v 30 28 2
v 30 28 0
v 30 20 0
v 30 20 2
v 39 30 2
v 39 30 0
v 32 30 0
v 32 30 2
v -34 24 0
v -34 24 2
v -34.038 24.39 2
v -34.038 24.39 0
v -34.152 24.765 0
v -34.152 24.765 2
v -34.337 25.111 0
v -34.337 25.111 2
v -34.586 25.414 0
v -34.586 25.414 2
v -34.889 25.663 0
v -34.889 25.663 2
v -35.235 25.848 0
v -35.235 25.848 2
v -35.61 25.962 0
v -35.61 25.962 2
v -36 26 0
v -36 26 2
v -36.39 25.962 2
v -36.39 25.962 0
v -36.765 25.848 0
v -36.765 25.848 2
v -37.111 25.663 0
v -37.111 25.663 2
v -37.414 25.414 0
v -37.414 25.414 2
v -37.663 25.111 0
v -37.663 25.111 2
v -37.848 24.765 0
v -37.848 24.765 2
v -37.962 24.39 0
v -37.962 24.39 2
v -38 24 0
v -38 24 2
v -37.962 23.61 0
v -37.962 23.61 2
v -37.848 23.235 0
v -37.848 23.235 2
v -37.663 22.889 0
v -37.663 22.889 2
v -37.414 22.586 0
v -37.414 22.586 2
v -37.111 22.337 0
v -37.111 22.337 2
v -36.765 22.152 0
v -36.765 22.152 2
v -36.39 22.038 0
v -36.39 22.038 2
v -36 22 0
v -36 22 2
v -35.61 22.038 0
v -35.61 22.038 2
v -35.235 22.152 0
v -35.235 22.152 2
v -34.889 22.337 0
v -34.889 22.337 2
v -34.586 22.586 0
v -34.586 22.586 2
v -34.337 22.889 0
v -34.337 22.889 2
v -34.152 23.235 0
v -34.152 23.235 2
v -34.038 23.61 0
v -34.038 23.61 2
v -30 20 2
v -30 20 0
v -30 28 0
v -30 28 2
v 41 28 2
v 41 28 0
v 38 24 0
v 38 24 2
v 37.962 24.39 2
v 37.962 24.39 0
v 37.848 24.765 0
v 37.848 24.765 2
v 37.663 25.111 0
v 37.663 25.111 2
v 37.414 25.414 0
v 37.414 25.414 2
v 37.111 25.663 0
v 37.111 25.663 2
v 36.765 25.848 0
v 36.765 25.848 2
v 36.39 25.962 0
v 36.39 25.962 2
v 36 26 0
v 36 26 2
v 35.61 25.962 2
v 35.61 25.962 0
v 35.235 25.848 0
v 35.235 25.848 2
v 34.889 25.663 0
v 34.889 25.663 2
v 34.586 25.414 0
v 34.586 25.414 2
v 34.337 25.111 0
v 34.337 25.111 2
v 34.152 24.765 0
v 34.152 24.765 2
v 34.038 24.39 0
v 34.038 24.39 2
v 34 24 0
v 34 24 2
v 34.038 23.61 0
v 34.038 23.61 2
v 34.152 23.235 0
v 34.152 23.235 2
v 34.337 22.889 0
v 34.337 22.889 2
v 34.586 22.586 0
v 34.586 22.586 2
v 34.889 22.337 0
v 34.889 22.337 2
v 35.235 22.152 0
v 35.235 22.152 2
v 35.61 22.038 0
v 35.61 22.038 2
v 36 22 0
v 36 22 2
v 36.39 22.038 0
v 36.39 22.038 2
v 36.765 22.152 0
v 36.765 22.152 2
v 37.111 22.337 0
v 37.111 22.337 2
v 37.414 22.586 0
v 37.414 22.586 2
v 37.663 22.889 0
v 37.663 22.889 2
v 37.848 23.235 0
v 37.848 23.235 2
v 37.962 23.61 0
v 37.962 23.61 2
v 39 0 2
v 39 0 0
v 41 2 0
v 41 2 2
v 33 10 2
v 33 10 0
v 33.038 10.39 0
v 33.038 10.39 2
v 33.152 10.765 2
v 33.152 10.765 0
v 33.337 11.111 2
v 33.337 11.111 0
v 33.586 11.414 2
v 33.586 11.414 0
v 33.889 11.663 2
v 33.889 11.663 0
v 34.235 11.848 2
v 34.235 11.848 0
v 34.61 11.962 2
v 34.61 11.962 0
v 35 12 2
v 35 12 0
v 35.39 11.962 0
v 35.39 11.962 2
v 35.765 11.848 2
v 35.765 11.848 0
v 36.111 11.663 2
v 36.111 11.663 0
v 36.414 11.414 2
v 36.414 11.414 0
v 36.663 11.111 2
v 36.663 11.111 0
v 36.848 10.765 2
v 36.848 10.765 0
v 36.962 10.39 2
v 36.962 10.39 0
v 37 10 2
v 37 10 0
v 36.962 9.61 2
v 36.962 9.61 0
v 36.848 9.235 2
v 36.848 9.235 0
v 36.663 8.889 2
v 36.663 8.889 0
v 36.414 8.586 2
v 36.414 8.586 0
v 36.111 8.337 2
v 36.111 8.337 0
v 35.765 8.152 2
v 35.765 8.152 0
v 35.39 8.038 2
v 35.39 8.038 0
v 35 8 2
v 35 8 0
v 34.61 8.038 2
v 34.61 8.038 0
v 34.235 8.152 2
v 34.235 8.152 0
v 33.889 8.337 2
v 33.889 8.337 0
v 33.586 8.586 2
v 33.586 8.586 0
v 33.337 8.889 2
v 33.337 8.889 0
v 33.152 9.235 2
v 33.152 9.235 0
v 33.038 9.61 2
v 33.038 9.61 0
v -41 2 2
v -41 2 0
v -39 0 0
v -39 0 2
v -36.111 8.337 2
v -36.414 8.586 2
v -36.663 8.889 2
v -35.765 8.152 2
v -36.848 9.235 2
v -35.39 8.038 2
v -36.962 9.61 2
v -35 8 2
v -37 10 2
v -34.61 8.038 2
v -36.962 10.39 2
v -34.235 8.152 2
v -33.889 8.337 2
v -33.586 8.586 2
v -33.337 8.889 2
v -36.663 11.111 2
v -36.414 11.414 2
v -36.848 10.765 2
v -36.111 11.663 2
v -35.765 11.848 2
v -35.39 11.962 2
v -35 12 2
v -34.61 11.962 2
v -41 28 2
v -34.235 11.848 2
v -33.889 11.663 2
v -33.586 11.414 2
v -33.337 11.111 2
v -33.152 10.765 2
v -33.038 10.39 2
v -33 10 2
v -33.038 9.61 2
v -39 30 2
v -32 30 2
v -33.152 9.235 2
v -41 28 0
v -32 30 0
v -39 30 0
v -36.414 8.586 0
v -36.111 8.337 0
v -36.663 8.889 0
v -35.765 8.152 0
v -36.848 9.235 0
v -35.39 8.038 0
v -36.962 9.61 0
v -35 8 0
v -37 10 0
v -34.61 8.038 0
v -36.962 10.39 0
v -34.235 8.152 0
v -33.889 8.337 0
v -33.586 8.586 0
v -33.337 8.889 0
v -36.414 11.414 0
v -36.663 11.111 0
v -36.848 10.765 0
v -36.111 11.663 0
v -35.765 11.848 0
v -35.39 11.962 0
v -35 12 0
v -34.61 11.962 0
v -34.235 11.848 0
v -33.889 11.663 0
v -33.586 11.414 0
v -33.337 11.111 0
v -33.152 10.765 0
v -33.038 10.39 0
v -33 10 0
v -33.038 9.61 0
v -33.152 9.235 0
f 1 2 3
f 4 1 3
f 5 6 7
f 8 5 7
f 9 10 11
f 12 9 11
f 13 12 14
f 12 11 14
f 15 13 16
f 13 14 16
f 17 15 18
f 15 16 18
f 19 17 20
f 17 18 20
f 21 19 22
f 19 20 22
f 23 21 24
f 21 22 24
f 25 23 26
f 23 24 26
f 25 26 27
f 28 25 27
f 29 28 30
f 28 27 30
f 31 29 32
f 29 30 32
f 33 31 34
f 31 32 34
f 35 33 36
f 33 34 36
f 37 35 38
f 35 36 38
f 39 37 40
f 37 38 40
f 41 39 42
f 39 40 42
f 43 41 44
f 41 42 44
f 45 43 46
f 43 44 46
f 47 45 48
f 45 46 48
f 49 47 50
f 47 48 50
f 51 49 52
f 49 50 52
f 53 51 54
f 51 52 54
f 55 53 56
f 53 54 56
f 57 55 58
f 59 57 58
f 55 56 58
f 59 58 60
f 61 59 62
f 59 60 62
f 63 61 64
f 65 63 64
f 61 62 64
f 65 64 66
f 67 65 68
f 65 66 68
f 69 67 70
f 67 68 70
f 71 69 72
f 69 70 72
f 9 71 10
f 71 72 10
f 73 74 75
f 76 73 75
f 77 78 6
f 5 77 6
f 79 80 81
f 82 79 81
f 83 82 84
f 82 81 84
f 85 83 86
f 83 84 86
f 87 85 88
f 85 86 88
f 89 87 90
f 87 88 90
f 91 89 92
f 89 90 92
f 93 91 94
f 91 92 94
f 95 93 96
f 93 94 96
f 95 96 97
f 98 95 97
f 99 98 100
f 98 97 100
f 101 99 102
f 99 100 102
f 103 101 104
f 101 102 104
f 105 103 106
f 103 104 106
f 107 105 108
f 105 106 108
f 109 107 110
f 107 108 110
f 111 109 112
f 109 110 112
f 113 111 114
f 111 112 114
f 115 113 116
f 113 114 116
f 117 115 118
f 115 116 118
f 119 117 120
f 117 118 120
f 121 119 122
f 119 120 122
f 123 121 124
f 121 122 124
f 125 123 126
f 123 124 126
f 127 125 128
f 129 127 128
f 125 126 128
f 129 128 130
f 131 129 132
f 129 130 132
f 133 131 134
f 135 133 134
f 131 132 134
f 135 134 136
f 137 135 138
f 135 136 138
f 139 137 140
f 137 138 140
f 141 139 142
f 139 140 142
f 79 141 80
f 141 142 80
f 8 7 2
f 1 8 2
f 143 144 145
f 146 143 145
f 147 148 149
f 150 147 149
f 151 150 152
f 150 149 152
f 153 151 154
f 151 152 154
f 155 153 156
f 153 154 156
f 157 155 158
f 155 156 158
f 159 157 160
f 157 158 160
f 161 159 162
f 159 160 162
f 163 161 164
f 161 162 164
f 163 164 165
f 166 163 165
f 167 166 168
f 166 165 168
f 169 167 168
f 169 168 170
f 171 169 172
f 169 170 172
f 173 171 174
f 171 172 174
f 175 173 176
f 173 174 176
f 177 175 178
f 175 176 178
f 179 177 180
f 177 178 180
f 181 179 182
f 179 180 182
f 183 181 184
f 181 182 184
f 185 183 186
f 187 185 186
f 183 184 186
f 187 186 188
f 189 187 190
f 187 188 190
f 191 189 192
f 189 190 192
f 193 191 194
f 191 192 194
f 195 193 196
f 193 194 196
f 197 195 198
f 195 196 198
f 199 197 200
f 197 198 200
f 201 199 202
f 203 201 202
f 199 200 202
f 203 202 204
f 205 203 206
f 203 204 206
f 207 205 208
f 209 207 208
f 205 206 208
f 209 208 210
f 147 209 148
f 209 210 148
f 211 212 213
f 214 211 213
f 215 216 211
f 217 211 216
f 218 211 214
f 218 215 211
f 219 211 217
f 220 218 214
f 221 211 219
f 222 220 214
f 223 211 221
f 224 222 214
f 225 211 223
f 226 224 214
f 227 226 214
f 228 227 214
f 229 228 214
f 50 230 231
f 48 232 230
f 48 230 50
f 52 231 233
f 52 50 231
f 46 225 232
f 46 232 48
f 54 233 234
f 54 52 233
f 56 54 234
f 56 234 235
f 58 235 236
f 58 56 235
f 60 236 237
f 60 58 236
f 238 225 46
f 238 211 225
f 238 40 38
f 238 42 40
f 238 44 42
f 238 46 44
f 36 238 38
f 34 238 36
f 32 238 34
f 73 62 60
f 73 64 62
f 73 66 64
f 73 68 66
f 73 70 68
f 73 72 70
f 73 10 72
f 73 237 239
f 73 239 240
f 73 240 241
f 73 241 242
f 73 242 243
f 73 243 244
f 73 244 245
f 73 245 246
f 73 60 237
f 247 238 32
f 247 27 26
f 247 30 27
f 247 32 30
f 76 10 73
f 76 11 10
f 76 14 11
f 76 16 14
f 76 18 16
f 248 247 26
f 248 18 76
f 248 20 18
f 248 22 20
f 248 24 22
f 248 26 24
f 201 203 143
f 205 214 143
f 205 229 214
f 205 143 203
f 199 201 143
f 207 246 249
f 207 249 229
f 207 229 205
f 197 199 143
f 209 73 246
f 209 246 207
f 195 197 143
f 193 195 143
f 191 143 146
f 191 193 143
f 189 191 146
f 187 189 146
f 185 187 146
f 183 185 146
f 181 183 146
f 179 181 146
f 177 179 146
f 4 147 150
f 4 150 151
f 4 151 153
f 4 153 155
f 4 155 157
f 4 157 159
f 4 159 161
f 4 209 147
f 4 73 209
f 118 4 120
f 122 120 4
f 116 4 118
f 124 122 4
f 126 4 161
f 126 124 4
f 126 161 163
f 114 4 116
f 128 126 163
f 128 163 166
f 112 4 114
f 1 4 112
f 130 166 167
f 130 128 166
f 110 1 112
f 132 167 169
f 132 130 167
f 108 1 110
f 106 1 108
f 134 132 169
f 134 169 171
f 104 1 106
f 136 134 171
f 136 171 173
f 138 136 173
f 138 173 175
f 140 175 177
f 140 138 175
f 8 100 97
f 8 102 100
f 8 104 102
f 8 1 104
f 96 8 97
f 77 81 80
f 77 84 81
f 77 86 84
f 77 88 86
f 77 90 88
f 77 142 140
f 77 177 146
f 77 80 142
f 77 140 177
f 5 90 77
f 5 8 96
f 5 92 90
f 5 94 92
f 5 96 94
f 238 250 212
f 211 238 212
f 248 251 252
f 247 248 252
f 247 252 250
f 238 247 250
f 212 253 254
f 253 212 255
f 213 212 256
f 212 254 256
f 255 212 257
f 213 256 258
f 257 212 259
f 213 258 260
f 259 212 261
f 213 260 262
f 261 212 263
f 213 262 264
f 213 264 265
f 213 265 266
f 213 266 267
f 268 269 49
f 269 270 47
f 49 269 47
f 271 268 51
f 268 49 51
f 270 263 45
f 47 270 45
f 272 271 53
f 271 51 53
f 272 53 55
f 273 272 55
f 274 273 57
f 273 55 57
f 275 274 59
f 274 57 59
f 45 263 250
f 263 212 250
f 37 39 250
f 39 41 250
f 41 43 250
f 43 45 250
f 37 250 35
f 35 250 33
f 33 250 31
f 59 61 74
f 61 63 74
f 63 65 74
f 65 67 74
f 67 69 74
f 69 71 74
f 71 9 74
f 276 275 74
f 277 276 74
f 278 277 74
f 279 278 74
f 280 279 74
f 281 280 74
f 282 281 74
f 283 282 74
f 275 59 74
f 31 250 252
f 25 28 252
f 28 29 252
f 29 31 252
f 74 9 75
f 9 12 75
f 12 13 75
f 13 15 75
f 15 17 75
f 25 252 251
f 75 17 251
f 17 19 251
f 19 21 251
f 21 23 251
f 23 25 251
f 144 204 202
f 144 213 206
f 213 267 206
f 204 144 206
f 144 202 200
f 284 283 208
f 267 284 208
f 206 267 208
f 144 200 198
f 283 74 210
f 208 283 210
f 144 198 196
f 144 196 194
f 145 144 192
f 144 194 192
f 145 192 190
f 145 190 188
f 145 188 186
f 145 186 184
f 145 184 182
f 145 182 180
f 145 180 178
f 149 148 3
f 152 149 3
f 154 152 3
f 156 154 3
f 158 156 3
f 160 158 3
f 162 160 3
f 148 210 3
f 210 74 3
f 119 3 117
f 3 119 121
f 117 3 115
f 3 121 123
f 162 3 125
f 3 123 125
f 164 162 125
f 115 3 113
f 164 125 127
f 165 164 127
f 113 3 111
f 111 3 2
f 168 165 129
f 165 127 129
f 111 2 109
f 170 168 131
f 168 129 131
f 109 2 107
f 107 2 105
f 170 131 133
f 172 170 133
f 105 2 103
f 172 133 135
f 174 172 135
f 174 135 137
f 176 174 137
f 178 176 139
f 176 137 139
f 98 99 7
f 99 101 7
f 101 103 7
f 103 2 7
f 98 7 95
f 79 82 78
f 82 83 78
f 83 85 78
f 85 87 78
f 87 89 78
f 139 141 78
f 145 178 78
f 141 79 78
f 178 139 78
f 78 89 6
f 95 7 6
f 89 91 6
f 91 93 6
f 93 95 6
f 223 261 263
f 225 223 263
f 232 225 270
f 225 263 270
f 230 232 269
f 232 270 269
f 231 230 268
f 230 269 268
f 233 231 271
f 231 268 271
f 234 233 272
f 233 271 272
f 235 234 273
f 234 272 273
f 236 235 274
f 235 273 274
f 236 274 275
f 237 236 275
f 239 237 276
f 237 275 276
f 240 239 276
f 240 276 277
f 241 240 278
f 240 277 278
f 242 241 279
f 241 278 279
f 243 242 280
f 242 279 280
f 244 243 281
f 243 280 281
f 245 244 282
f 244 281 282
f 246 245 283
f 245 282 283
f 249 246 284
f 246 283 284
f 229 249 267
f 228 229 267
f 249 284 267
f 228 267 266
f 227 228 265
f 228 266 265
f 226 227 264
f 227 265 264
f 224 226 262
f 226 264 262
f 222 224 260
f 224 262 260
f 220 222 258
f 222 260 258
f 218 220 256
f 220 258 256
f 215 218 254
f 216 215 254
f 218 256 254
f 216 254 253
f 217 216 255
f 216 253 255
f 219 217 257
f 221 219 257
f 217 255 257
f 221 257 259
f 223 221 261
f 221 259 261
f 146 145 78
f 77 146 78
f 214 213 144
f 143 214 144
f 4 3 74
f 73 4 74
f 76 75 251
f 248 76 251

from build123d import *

# Parameters (mm, degrees)
BOSS_EXTRUDE1_DEPTH = 2
SKETCH2_R           = 2
CUT_EXTRUDE1_DEPTH  = 2
SKETCH3_R           = 2
CUT_EXTRUDE2_DEPTH  = 2


with BuildPart() as part:
    # Sketch1 → Boss-Extrude1 (new body)
    with BuildSketch(Plane.XY):
        Polygon((-41, 2), (-39, 0), (0, 0), (0, 20), (-30, 20), (-30, 28), (-32, 30), (-39, 30), (-41, 28), align=None)
        Polygon((0, 20), (0, 0), (39, 0), (41, 2), (41, 28), (39, 30), (32, 30), (30, 28), (30, 20), align=None)
    extrude(amount=BOSS_EXTRUDE1_DEPTH)

    # Sketch2 → Cut-Extrude1 (cut)
    with BuildSketch(Plane.XY.offset(2)):
        with Locations((-36, 24)):
            Circle(SKETCH2_R)
        with Locations((36, 24)):
            Circle(SKETCH2_R)
    extrude(amount=-CUT_EXTRUDE1_DEPTH, mode=Mode.SUBTRACT)

    # Sketch3 → Cut-Extrude2 (cut)
    with BuildSketch(Plane(origin=(0, 0, 0), x_dir=(-1, 0, 0), z_dir=(0, 0, -1))):
        with Locations((-35, 10)):
            Circle(SKETCH3_R)
        with Locations((35, 10)):
            Circle(SKETCH3_R)
    extrude(amount=-CUT_EXTRUDE2_DEPTH, mode=Mode.SUBTRACT)


solid = part.part
